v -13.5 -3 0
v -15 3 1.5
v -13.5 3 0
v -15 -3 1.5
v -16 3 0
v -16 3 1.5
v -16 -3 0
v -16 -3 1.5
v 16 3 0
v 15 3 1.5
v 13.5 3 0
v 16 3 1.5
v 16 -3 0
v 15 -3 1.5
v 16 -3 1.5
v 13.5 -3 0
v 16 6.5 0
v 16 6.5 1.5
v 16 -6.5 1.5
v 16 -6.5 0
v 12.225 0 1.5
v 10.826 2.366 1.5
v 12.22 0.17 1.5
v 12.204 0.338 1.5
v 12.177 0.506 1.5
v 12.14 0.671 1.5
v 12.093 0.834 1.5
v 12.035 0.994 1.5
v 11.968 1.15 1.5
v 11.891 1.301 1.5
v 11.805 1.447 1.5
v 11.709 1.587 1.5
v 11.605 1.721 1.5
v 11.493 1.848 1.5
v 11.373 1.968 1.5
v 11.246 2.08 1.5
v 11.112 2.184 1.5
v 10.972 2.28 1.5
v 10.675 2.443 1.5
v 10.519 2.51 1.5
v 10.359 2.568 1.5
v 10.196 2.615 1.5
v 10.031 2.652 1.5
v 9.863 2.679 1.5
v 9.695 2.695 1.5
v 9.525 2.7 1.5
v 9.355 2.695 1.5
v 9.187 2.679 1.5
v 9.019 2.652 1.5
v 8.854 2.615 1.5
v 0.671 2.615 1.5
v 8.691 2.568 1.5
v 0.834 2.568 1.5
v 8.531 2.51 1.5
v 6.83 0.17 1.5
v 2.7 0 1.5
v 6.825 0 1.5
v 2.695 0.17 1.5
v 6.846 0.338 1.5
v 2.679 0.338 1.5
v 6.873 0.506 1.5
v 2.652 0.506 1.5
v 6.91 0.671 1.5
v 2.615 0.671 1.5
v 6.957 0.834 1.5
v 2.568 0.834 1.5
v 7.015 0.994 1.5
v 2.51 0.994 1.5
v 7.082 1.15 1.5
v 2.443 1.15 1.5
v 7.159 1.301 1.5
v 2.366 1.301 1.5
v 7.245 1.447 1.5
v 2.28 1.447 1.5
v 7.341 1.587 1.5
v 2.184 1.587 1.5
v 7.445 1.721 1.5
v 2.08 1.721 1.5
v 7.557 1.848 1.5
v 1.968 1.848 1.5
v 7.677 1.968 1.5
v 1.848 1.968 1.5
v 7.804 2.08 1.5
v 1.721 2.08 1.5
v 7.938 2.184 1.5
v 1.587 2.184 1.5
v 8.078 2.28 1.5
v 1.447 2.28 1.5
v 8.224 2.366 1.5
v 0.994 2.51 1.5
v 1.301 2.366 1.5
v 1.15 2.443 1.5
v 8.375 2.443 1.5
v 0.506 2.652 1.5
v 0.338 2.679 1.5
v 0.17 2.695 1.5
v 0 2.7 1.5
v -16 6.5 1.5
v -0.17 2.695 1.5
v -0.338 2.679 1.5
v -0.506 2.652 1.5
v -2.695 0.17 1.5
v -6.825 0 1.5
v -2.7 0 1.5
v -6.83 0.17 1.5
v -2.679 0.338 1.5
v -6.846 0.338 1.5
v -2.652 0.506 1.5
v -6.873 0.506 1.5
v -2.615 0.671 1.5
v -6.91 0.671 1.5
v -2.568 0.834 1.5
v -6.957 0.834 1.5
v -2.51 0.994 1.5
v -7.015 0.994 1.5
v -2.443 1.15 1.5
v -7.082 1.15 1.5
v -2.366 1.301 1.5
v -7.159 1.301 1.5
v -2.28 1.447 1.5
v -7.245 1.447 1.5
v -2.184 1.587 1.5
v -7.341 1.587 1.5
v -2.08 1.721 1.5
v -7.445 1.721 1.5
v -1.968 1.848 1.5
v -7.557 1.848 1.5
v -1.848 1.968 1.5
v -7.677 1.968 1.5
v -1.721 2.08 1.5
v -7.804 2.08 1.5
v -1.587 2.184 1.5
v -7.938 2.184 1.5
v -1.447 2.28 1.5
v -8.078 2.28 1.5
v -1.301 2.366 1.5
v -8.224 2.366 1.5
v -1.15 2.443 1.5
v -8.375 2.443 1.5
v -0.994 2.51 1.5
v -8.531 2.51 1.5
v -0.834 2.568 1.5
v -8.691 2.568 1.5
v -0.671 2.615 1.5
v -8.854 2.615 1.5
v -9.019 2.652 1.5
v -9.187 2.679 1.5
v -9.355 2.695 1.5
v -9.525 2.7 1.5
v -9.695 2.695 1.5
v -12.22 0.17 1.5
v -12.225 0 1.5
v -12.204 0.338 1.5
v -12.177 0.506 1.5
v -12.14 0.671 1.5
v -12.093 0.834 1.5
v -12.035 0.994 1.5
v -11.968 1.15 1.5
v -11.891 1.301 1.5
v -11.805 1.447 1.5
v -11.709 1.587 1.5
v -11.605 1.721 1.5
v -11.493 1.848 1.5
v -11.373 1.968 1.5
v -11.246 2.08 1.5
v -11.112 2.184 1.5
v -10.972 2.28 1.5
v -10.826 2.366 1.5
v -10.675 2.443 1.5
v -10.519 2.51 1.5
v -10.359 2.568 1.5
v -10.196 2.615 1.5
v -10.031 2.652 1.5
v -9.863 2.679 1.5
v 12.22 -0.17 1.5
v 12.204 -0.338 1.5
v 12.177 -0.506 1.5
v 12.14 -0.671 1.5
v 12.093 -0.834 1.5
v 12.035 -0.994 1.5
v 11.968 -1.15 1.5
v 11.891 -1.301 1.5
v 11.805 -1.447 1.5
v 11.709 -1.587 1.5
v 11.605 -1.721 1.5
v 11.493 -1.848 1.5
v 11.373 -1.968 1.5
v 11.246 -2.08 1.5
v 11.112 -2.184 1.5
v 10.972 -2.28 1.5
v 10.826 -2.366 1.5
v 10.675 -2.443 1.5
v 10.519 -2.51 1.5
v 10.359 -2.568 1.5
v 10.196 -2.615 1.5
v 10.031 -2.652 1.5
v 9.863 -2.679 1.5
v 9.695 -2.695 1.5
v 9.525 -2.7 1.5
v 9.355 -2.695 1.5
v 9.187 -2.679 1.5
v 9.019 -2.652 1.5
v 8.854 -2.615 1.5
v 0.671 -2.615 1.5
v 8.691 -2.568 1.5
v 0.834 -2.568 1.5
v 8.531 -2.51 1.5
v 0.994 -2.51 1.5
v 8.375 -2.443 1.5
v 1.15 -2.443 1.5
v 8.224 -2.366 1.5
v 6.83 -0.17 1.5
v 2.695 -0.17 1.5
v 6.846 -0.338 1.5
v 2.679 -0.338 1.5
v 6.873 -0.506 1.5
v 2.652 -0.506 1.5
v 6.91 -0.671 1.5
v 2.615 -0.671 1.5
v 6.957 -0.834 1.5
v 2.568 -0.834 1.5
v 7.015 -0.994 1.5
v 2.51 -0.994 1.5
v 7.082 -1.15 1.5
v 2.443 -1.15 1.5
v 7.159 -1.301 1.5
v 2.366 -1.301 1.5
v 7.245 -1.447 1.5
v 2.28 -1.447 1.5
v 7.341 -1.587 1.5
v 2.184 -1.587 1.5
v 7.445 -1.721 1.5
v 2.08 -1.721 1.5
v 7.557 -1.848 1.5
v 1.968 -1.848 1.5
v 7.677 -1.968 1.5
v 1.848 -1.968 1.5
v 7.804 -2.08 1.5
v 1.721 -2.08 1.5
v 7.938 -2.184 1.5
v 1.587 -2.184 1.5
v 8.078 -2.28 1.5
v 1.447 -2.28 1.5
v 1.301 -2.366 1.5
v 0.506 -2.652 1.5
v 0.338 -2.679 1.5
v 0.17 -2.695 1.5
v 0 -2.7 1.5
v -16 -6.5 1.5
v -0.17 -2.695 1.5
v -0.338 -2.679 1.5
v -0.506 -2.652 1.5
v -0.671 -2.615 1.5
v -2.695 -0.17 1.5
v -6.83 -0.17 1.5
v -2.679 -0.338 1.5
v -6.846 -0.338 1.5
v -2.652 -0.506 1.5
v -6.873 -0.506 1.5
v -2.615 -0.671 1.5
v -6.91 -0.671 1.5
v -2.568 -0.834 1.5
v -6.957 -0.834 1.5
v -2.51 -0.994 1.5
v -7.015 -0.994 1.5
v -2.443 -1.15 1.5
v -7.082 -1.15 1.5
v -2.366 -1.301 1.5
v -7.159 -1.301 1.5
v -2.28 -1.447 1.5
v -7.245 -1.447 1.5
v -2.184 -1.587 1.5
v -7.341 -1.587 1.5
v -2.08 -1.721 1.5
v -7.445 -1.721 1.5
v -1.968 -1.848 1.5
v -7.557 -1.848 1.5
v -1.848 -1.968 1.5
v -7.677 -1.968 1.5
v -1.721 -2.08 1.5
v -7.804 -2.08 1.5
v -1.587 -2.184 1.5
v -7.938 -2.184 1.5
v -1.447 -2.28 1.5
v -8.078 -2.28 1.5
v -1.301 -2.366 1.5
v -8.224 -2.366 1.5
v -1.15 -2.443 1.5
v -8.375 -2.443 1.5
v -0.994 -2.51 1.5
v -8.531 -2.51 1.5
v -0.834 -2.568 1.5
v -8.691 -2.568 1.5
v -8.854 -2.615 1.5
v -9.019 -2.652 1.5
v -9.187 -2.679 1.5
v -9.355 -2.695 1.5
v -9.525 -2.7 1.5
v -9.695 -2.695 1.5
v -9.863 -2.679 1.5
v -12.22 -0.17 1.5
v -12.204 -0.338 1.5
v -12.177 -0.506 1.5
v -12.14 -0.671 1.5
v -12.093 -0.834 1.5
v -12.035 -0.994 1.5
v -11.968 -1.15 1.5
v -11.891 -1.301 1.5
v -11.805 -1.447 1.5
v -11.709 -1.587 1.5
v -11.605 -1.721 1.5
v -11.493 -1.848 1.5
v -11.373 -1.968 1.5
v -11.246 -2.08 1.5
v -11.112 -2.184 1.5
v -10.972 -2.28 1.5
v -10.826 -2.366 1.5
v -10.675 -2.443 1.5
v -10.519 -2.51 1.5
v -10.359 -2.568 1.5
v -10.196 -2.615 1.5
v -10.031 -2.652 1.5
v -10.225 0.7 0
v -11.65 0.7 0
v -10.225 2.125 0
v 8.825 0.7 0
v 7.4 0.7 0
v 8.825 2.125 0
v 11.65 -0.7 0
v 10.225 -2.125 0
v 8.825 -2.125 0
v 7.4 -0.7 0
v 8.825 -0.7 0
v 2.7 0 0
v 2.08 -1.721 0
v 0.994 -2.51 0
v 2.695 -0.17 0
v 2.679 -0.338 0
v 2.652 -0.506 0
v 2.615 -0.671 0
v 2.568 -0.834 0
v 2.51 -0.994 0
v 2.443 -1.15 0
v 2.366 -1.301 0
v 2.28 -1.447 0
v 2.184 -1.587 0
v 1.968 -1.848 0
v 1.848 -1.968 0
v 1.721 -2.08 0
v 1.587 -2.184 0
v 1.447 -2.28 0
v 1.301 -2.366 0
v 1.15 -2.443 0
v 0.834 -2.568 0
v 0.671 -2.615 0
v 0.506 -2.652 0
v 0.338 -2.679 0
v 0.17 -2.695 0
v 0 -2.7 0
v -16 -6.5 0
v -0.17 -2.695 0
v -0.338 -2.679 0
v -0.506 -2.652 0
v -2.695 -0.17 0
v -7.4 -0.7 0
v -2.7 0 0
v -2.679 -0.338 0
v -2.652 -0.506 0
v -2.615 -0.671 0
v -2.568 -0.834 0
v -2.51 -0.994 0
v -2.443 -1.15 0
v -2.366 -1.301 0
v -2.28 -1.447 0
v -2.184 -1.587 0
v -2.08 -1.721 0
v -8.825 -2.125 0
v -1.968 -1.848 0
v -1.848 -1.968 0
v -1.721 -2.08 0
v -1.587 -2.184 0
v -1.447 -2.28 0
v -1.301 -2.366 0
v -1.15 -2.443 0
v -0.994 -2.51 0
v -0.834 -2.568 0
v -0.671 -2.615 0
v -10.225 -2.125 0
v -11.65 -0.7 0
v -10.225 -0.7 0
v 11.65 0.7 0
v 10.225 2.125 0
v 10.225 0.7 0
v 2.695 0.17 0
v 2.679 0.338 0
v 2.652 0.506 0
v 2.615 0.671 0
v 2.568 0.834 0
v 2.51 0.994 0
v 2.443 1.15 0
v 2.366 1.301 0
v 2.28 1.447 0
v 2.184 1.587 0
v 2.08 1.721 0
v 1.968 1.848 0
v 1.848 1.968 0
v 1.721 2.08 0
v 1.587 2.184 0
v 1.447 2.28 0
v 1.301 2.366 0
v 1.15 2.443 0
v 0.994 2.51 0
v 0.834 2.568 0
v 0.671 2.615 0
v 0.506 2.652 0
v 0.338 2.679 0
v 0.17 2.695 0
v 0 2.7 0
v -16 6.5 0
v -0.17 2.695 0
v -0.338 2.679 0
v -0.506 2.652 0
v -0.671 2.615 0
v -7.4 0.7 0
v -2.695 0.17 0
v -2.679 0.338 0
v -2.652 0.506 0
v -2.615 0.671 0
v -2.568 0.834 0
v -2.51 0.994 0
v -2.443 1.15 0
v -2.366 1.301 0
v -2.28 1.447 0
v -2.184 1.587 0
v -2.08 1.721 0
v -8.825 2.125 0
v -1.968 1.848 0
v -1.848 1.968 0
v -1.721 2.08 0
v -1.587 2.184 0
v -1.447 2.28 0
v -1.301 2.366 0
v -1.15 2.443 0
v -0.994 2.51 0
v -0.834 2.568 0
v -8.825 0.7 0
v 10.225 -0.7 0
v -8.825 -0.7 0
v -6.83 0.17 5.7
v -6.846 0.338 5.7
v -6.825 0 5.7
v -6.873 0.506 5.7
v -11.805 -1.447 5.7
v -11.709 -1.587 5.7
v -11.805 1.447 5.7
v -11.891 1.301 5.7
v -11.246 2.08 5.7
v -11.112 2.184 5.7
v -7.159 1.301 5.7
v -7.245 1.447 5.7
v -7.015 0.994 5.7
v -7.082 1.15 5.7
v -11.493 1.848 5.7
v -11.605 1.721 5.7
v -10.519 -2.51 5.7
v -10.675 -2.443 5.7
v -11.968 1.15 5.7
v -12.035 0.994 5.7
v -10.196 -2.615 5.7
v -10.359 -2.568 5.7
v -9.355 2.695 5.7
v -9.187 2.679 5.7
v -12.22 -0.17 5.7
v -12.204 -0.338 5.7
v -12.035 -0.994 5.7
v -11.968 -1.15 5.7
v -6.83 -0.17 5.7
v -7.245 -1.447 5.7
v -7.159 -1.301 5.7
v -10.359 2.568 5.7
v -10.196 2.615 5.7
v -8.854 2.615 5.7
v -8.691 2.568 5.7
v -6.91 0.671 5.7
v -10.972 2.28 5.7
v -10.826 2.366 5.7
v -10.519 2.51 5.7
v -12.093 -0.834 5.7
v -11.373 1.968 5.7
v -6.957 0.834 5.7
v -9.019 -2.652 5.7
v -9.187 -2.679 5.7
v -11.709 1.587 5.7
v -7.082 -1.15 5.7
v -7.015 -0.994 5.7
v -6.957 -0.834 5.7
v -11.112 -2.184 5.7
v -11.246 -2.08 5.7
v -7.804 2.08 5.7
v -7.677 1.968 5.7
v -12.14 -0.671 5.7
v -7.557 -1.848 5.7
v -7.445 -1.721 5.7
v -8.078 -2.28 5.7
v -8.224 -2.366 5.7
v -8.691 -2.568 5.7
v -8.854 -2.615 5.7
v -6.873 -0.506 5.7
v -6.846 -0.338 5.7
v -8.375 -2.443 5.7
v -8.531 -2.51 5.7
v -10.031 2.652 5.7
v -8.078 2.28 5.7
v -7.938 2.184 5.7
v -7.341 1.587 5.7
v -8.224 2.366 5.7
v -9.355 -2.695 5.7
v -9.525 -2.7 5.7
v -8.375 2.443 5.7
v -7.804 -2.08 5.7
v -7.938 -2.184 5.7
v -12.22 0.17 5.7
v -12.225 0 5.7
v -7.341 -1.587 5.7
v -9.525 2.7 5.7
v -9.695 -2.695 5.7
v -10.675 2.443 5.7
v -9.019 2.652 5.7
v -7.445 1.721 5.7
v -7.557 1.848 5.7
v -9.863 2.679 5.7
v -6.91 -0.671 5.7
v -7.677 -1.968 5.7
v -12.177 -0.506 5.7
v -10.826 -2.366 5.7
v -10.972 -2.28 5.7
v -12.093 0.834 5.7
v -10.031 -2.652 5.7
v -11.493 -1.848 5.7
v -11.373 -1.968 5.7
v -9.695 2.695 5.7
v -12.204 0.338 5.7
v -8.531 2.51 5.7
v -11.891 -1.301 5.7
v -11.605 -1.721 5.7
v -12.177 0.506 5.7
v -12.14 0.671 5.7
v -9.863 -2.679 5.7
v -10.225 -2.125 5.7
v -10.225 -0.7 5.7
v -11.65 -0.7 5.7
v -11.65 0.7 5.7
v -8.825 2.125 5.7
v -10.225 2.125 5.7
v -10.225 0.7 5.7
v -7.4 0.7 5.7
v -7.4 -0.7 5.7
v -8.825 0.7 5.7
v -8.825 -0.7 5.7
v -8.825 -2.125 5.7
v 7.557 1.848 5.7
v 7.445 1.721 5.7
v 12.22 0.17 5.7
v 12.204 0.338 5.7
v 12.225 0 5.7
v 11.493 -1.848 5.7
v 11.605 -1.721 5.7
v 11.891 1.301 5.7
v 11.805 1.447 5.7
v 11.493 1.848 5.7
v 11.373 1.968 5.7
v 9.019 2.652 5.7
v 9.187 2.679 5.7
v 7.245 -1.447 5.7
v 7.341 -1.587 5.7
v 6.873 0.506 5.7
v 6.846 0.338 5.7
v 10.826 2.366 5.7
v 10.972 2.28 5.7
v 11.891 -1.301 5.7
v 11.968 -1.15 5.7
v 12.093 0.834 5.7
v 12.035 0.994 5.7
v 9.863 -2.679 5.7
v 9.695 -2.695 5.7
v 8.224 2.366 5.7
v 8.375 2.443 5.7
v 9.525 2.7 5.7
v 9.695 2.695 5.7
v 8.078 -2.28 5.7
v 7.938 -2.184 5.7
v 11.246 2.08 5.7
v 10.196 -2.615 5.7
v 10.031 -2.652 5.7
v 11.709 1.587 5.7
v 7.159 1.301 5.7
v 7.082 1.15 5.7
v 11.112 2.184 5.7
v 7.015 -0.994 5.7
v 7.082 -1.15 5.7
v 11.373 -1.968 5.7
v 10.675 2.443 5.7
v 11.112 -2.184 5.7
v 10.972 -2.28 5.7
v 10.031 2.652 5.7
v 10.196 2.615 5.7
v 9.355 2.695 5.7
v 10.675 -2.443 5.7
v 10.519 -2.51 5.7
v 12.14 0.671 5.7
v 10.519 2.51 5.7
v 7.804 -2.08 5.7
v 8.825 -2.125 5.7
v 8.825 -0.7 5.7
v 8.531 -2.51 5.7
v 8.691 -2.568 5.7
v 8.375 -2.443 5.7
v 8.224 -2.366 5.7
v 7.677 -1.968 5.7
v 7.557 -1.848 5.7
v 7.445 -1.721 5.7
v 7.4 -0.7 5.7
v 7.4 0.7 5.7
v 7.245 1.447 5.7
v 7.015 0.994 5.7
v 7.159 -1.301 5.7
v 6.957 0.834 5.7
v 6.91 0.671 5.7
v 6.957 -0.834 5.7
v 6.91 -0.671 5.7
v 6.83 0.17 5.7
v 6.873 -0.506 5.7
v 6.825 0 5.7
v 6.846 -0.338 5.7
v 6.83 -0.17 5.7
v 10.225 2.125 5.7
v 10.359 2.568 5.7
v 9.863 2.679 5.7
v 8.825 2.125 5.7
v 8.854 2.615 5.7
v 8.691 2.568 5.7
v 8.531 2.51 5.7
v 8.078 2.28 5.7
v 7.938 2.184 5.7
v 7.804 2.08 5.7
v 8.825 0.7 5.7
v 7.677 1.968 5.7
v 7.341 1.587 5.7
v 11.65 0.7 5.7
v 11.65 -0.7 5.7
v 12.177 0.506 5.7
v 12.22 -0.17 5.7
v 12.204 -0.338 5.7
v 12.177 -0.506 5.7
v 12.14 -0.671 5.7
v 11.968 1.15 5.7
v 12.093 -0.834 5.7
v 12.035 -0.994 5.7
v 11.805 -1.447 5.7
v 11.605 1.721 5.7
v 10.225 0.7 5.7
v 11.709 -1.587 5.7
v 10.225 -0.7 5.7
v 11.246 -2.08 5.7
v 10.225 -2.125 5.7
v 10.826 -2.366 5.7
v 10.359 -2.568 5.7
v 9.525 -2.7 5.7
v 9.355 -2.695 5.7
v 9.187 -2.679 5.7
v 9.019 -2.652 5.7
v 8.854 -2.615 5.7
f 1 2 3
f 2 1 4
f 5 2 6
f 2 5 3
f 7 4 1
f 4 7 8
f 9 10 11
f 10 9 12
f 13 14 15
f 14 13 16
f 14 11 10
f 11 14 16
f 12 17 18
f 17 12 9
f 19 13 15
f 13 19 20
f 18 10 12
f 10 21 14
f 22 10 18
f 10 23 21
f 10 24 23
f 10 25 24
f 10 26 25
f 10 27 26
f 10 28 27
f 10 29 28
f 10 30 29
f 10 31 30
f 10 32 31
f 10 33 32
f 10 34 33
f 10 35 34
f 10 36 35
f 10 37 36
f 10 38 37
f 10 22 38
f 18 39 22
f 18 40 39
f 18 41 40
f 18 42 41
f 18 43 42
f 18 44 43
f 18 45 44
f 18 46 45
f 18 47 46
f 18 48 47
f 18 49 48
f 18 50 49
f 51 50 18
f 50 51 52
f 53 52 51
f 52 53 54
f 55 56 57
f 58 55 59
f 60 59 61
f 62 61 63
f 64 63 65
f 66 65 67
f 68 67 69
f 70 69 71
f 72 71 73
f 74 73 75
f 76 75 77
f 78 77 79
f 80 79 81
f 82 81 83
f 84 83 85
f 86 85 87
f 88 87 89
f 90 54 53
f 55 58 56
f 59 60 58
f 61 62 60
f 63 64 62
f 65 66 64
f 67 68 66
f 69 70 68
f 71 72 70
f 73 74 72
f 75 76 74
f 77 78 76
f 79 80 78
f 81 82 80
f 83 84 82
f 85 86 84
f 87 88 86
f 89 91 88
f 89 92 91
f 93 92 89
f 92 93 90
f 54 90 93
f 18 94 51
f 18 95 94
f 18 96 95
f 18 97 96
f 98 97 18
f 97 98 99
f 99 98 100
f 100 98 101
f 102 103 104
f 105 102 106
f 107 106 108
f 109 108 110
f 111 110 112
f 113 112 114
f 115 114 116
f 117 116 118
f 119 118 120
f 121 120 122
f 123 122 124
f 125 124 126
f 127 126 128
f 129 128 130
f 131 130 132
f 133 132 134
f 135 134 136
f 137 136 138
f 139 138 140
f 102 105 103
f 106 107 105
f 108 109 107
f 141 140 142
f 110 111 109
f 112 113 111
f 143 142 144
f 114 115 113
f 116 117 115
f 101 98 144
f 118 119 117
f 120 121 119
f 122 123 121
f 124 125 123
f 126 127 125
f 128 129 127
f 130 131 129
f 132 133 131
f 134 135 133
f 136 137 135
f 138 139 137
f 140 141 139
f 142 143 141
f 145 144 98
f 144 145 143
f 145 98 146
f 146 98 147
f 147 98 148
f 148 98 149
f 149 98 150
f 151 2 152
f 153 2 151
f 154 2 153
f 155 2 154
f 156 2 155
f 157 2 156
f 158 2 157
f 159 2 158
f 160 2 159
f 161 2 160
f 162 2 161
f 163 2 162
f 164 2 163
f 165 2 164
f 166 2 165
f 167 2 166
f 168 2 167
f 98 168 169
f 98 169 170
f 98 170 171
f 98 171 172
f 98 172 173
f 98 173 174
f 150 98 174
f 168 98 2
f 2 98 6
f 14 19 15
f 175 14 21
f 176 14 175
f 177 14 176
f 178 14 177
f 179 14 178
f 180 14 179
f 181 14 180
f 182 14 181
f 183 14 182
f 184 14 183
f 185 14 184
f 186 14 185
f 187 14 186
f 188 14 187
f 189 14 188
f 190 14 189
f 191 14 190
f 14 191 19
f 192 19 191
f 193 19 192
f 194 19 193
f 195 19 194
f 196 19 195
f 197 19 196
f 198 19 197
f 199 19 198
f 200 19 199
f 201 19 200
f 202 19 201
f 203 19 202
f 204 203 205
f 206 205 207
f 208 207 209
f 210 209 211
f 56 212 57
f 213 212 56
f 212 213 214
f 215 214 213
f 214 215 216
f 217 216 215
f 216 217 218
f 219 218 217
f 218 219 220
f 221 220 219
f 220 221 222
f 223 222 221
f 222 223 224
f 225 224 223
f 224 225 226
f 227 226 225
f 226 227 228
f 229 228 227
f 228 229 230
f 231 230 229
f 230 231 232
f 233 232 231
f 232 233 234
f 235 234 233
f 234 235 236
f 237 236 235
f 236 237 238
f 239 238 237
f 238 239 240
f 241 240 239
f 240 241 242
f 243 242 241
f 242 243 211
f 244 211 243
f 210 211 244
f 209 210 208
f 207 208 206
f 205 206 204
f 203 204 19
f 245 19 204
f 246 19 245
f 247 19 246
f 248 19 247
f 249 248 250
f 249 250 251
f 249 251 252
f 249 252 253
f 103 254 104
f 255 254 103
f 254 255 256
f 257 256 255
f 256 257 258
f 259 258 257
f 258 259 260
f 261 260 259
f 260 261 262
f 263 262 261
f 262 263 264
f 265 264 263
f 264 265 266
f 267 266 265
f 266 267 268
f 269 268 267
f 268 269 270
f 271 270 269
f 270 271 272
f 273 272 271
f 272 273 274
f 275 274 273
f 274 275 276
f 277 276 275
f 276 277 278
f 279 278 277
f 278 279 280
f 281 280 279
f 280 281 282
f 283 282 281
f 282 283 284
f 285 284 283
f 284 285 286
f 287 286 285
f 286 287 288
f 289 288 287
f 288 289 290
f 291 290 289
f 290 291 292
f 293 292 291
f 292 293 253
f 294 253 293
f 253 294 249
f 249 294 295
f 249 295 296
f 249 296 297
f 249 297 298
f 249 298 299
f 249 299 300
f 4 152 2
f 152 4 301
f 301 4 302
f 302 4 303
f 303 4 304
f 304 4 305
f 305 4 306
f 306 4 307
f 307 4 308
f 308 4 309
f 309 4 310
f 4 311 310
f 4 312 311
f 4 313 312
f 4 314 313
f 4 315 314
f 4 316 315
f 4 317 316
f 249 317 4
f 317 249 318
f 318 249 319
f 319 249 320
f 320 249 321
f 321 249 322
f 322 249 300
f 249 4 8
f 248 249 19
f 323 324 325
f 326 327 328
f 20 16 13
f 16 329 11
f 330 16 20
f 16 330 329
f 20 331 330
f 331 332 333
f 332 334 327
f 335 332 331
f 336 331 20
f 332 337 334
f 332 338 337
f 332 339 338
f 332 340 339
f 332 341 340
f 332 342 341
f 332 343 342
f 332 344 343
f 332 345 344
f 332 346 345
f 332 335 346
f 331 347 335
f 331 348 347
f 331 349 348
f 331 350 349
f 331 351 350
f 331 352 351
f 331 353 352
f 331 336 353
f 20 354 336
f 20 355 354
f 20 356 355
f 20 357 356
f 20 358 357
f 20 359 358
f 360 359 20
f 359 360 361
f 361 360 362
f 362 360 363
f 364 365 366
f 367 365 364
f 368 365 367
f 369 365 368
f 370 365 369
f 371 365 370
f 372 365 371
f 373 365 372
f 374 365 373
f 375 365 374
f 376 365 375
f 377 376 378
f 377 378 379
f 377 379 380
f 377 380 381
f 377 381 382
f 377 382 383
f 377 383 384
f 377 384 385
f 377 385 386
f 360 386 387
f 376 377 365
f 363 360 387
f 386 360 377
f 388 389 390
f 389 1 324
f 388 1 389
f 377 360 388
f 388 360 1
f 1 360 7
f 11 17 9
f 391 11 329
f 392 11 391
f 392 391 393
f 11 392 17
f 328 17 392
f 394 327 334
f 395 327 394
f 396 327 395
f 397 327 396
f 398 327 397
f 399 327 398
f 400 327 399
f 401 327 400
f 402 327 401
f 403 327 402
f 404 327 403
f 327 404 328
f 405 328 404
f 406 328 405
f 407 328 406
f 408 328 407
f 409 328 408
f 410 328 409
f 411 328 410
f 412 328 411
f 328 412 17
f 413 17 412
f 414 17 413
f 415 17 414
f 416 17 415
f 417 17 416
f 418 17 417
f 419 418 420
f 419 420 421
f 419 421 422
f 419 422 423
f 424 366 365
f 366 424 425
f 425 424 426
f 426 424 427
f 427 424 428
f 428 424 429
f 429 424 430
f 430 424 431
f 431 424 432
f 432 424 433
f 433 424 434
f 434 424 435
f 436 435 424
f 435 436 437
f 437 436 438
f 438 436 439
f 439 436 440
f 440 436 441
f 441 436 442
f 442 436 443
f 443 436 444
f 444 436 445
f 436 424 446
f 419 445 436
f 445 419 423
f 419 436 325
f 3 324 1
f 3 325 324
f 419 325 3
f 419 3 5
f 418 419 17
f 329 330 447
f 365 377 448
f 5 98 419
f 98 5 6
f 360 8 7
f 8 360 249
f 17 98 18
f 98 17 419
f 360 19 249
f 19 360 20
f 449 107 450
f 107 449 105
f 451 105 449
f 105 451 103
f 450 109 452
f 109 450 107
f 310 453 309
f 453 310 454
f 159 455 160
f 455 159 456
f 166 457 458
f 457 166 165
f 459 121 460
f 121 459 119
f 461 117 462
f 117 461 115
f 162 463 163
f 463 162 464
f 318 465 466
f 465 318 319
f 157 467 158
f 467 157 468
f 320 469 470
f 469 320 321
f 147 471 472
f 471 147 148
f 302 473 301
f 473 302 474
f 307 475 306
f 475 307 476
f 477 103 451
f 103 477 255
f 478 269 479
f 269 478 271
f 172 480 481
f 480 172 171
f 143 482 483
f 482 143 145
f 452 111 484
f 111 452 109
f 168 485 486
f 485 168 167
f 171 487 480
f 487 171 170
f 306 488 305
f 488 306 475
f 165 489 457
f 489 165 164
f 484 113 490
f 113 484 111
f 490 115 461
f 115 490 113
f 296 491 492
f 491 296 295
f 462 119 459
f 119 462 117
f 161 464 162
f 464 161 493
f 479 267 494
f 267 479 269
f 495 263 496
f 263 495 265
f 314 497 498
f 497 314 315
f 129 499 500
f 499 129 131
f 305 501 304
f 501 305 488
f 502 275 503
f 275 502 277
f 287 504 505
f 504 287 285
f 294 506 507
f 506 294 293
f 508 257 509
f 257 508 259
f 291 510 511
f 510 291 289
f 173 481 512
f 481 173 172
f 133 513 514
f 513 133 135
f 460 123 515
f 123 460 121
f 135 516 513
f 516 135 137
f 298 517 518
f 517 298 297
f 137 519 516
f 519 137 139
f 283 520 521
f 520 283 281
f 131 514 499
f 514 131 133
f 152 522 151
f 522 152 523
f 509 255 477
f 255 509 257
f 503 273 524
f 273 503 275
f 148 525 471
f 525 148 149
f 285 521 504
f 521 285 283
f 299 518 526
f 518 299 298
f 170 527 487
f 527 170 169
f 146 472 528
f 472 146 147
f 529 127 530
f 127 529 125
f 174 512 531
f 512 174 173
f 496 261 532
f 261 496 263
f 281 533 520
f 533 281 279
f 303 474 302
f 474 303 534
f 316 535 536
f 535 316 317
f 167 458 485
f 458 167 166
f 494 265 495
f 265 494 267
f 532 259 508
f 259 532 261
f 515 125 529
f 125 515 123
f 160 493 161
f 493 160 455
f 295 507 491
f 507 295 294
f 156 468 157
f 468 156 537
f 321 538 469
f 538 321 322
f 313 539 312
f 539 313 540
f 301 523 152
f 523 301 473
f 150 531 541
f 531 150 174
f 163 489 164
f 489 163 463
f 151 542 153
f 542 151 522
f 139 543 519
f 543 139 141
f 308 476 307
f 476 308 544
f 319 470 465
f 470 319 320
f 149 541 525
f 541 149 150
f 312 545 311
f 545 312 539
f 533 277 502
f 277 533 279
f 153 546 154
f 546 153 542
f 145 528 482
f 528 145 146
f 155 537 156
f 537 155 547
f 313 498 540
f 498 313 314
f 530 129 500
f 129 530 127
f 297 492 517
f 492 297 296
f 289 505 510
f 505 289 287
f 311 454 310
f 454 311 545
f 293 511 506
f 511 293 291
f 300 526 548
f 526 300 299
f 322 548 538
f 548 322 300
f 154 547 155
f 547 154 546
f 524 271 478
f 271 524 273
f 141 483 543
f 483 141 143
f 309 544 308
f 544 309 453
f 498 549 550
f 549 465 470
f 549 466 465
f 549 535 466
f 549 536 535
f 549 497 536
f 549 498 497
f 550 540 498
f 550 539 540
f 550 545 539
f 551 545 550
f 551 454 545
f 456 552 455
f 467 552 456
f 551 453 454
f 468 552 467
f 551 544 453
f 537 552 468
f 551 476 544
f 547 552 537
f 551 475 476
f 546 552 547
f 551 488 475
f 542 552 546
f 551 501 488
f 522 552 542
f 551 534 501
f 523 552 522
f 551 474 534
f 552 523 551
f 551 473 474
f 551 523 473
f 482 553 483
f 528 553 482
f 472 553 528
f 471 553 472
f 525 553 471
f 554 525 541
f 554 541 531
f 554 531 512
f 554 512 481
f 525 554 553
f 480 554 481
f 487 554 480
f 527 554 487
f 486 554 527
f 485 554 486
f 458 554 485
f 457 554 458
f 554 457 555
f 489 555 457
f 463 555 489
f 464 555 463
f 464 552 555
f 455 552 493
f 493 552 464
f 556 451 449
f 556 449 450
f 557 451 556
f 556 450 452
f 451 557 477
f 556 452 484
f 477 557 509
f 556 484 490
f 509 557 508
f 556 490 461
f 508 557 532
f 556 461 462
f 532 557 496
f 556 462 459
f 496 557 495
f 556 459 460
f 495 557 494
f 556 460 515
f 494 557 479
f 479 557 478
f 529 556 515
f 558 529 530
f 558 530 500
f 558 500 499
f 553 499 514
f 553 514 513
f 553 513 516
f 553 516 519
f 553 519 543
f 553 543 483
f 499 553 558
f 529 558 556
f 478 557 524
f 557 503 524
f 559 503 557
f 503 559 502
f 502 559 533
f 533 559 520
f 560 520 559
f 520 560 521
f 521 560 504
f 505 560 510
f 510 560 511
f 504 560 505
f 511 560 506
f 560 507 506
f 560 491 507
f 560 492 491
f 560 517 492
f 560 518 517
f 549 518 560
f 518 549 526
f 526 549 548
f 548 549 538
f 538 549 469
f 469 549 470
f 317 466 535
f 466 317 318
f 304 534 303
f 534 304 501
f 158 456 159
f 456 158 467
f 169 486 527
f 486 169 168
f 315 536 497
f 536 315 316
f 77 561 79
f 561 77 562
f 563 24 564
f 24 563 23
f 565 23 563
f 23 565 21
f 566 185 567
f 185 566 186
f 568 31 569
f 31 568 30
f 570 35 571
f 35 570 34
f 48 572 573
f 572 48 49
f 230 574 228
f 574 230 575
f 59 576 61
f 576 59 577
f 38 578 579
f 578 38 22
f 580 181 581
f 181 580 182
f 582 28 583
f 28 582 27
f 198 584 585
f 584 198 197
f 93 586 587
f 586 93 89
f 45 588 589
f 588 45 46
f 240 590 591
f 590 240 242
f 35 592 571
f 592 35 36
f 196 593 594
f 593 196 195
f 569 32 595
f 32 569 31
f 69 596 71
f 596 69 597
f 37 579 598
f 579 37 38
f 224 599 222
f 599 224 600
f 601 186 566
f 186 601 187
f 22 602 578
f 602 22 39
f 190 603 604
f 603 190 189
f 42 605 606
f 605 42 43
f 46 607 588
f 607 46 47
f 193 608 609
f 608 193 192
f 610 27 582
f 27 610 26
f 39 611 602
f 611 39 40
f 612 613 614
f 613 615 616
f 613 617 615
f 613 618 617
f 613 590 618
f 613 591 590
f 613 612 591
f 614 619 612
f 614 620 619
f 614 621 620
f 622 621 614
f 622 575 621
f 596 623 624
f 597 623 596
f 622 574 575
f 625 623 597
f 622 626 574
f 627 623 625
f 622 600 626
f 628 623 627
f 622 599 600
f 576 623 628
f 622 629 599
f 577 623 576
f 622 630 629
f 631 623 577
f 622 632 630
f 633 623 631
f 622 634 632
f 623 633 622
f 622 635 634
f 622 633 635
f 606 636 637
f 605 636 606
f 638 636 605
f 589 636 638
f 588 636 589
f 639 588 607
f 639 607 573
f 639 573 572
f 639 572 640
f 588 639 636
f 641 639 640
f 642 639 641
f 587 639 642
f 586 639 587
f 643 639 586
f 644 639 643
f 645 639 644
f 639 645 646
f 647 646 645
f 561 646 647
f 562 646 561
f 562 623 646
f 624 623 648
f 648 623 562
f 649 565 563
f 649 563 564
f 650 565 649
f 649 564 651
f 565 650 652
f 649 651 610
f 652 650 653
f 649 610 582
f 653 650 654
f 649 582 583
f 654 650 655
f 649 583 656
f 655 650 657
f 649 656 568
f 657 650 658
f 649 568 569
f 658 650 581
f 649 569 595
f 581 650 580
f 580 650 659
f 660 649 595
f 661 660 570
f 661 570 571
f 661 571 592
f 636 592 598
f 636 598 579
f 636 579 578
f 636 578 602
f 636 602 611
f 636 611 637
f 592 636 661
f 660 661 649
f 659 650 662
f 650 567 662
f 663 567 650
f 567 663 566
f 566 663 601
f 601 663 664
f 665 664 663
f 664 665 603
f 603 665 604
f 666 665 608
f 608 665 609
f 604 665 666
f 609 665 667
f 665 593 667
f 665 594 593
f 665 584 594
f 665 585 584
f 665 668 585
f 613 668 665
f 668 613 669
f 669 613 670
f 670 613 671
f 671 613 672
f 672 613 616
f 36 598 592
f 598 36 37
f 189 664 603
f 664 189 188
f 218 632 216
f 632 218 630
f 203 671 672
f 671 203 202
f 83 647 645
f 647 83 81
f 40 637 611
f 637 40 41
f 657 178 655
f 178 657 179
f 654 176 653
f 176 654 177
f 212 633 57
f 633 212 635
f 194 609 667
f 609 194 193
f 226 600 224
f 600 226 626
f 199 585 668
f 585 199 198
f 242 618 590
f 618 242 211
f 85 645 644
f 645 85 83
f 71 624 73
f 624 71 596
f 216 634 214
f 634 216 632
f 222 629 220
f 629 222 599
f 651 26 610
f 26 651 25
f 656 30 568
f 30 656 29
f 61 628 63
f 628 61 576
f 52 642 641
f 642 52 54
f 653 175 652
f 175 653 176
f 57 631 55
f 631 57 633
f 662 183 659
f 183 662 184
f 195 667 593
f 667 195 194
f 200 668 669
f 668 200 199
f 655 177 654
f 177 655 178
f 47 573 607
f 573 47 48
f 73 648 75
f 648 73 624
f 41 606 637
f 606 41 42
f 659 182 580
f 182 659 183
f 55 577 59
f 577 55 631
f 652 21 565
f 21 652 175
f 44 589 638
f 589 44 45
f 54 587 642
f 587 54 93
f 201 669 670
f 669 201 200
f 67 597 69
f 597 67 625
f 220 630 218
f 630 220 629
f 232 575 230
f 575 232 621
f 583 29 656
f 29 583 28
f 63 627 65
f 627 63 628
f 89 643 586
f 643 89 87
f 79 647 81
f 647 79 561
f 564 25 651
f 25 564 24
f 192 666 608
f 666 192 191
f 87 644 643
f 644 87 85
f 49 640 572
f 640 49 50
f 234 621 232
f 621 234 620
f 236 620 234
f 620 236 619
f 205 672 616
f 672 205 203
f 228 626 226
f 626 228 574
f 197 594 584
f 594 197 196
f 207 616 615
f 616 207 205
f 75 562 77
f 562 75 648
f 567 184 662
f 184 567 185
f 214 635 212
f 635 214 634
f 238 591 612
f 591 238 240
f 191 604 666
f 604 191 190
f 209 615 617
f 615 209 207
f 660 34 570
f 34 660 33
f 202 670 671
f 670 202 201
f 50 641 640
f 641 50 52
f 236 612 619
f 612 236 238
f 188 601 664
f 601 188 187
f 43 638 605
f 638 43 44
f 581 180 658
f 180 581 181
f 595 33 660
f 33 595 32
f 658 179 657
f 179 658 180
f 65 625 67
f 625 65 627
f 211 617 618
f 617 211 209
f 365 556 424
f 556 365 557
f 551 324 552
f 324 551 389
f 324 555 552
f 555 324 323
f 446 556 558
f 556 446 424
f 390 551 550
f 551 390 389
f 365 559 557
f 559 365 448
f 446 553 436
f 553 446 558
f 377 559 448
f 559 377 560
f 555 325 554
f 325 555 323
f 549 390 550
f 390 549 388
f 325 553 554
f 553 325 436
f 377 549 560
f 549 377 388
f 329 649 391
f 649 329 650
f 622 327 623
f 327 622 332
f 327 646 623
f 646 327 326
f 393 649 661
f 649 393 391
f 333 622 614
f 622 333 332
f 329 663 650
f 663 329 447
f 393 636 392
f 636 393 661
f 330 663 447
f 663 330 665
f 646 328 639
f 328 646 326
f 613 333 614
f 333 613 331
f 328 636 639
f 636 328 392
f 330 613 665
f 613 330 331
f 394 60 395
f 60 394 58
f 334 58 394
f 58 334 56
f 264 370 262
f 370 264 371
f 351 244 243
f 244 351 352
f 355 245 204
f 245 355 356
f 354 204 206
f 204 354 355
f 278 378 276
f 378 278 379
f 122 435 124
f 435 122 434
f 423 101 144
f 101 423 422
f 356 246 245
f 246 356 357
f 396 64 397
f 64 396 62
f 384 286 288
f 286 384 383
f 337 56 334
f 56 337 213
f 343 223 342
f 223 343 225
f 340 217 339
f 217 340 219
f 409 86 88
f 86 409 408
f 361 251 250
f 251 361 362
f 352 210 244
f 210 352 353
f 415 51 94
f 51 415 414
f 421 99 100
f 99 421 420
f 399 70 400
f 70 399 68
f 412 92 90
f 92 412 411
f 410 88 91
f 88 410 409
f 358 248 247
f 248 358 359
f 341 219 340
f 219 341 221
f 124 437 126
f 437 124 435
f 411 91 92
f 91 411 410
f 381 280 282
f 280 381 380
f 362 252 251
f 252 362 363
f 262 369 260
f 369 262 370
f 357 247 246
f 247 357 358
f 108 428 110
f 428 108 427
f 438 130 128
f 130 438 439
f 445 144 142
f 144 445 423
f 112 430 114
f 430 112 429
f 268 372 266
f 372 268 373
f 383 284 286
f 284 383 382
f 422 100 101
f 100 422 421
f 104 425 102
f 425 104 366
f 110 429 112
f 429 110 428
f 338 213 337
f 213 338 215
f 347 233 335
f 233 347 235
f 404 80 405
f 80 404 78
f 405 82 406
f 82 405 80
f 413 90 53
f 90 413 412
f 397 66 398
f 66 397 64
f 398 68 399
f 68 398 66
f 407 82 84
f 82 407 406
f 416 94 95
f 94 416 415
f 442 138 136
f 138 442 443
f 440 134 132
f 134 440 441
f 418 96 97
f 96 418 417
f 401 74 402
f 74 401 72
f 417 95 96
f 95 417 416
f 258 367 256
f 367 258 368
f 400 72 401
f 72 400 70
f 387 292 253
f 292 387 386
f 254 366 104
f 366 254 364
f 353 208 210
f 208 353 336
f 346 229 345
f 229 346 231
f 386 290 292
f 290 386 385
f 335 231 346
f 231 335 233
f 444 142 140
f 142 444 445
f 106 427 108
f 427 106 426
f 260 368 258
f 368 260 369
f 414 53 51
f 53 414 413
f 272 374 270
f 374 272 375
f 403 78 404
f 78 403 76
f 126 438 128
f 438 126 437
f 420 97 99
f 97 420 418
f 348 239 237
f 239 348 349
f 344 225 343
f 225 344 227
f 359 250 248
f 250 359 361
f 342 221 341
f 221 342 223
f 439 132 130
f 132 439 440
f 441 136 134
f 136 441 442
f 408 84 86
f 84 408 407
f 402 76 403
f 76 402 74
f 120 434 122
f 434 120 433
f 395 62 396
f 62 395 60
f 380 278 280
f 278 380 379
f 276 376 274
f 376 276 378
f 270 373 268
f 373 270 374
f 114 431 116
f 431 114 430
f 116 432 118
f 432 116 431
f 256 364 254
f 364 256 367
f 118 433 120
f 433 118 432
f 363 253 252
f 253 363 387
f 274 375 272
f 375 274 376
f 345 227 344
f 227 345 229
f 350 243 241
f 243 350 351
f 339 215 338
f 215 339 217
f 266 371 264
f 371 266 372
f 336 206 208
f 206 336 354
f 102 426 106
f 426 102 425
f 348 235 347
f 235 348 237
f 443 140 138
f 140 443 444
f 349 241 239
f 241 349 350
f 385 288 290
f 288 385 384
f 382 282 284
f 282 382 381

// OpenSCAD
$e = $preview ? 0.1 : 0; $2e = 2*$e;
$fn = $preview ? 32 : 100;

U = 19.05;



2u_adapter();



module 2u_adapter(stem_h = 5.7, id = 5.4){
	difference(){
		union(){
			base();
			translate([-U/2,0,0]) cylinder(d=5.4,h=stem_h);
			translate([+U/2,0,0]) cylinder(d=5.4,h=stem_h);
		}
		translate([0,0,-$e]) cylinder(d=id, h=stem_h+$2e);
		translate([-U/2,0,0]) stem_pocket(stem_h);
		translate([+U/2,0,0]) stem_pocket(stem_h);
	}

	module base(){
		w = 32;
		h = 13;
		difference(){
			translate([-w/2, -h/2, 0]) cube([w,h,1.5]);
			for(s = [-1,+1]) scale([s,1,1]) 
				translate([w/2-3.5, -3, -1]) rotate([0,45,0])
					cube([2,6,5]);
		}
	}

	module stem_pocket(depth, extra=0.05){
		w = 4.20 + extra;
		h = 1.35 + extra;
		translate([-w/2,-h/2, -$e]) cube([w,h,depth+$2e]);
		translate([-h/2,-w/2, -$e]) cube([h,w,depth+$2e]);
	}
}
